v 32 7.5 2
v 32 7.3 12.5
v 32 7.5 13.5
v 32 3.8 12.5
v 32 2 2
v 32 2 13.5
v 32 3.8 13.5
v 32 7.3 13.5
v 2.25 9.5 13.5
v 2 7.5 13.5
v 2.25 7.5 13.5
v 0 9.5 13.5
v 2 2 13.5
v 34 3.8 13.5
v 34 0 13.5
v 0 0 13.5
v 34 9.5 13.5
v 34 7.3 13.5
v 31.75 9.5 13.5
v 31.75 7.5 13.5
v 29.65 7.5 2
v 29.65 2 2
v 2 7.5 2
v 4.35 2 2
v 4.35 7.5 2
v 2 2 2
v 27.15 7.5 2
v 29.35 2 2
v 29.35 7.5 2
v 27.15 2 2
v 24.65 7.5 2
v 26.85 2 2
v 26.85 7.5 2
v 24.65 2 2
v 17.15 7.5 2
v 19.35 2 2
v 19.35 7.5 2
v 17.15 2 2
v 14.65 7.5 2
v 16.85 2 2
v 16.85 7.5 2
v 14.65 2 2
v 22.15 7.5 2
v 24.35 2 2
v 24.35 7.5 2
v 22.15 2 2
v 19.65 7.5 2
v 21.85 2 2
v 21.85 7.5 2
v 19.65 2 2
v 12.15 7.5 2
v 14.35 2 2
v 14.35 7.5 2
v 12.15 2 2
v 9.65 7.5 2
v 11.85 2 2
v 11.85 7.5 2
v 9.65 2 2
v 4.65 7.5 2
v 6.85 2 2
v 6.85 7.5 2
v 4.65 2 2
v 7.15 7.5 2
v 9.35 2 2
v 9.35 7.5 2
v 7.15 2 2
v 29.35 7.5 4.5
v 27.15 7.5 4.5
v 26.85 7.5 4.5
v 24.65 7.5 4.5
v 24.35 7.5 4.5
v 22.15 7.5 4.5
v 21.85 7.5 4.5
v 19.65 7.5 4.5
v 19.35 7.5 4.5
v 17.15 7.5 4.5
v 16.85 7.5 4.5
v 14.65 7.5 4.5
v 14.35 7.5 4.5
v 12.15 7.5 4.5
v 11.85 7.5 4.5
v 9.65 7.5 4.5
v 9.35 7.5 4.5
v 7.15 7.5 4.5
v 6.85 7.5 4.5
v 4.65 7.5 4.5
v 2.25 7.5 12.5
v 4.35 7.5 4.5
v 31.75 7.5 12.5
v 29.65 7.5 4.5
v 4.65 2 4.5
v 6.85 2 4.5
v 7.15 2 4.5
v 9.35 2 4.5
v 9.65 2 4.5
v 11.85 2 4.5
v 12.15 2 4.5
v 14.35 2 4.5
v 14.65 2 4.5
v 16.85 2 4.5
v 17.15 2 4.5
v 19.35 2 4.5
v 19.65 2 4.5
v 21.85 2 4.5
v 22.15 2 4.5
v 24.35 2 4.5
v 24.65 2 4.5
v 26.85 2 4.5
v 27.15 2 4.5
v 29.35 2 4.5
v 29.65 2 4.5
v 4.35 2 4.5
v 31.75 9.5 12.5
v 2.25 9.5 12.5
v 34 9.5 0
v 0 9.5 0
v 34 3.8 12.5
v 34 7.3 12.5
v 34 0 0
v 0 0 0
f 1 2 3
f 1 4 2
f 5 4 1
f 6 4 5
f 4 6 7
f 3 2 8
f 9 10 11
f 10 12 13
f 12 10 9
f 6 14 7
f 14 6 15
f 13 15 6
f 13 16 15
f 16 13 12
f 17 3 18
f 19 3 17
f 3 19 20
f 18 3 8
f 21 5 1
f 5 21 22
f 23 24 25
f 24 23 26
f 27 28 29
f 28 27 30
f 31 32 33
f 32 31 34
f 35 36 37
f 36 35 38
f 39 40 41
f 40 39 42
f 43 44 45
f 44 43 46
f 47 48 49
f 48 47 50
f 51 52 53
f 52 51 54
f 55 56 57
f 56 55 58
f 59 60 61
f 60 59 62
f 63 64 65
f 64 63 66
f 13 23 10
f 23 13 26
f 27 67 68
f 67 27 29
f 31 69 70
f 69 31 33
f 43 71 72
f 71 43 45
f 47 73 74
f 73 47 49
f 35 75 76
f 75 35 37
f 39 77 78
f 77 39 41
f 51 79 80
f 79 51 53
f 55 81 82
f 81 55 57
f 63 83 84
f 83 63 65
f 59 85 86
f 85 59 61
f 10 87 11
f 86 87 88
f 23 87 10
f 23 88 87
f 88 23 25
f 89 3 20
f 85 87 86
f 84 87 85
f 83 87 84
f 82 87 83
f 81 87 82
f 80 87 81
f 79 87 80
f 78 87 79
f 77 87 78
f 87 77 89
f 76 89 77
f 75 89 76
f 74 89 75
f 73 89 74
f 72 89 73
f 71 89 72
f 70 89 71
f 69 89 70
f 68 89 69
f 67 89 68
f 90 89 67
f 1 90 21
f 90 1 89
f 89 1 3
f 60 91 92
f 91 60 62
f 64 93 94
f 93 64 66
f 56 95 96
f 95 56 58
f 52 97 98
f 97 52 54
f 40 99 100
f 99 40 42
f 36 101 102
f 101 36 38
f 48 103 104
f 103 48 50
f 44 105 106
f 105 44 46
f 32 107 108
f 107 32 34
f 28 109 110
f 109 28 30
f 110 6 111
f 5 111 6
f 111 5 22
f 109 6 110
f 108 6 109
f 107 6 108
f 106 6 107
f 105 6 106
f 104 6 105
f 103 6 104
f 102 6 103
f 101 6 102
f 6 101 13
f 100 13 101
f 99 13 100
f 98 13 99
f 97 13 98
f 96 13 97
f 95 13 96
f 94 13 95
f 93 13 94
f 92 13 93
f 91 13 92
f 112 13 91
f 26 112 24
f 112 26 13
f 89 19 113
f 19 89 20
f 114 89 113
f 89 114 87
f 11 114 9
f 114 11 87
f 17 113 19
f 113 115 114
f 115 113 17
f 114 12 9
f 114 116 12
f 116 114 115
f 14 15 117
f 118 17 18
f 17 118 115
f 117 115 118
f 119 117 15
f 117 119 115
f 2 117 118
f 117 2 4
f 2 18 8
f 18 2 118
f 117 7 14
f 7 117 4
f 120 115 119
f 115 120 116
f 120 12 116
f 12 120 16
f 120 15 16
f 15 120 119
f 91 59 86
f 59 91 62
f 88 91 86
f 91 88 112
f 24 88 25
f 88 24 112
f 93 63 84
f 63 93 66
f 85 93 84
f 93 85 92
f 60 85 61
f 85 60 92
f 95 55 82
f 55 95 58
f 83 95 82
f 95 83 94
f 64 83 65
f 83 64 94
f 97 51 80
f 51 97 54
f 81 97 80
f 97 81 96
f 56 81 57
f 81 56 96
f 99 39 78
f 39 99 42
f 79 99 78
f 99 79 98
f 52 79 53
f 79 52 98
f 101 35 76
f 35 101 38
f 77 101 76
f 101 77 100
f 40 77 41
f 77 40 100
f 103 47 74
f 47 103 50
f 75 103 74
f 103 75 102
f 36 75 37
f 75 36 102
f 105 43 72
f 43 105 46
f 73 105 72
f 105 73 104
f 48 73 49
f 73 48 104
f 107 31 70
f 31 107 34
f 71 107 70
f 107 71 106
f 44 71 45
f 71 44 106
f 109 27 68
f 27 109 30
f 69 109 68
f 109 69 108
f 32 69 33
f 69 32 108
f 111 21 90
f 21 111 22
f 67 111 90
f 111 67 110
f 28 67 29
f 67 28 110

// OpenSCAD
wall        = 2.0;
depth       = 11.5;

led_count   = 12;
led_width   = 5.5;
led_height  = 2.0;
led_space   = 0.5;

all_length = led_count*(led_height + led_space);

// main housing
difference() {
    cube([all_length + 2*wall,
      led_width + 2*wall,
      depth + wall]);
    
    translate([wall,wall,wall]) {
        // LED cutout
        cube([all_length,
              led_width,
              depth]);
        
        // resistor cutout
        cutout_depth = 1;
        cutout_diff = 0.5;
        translate([+cutout_diff/2,led_width,depth-cutout_depth]) {
            cube([all_length - cutout_diff, wall, cutout_depth]);
        }
        
        // capacitor cutout
        cutout_len = 3.5;
        cutout_offset = 0.8;
        translate([all_length,((led_width-cutout_len)/2+cutout_offset),depth-cutout_depth]) {
            cube([wall, cutout_len, cutout_depth]);
        }
    }
}

// ribs
rib_gap = 0.2;
rib_height = 2.5;
translate([wall+led_height+(rib_gap/2)+(led_space/2), wall, wall]){
    for (i = [0 : 1 : (led_count-2)]) {
        translate([i*(led_height+led_space), 0, 0]){
            cube([led_space - rib_gap, led_width, rib_height]);
        }
    }
}
